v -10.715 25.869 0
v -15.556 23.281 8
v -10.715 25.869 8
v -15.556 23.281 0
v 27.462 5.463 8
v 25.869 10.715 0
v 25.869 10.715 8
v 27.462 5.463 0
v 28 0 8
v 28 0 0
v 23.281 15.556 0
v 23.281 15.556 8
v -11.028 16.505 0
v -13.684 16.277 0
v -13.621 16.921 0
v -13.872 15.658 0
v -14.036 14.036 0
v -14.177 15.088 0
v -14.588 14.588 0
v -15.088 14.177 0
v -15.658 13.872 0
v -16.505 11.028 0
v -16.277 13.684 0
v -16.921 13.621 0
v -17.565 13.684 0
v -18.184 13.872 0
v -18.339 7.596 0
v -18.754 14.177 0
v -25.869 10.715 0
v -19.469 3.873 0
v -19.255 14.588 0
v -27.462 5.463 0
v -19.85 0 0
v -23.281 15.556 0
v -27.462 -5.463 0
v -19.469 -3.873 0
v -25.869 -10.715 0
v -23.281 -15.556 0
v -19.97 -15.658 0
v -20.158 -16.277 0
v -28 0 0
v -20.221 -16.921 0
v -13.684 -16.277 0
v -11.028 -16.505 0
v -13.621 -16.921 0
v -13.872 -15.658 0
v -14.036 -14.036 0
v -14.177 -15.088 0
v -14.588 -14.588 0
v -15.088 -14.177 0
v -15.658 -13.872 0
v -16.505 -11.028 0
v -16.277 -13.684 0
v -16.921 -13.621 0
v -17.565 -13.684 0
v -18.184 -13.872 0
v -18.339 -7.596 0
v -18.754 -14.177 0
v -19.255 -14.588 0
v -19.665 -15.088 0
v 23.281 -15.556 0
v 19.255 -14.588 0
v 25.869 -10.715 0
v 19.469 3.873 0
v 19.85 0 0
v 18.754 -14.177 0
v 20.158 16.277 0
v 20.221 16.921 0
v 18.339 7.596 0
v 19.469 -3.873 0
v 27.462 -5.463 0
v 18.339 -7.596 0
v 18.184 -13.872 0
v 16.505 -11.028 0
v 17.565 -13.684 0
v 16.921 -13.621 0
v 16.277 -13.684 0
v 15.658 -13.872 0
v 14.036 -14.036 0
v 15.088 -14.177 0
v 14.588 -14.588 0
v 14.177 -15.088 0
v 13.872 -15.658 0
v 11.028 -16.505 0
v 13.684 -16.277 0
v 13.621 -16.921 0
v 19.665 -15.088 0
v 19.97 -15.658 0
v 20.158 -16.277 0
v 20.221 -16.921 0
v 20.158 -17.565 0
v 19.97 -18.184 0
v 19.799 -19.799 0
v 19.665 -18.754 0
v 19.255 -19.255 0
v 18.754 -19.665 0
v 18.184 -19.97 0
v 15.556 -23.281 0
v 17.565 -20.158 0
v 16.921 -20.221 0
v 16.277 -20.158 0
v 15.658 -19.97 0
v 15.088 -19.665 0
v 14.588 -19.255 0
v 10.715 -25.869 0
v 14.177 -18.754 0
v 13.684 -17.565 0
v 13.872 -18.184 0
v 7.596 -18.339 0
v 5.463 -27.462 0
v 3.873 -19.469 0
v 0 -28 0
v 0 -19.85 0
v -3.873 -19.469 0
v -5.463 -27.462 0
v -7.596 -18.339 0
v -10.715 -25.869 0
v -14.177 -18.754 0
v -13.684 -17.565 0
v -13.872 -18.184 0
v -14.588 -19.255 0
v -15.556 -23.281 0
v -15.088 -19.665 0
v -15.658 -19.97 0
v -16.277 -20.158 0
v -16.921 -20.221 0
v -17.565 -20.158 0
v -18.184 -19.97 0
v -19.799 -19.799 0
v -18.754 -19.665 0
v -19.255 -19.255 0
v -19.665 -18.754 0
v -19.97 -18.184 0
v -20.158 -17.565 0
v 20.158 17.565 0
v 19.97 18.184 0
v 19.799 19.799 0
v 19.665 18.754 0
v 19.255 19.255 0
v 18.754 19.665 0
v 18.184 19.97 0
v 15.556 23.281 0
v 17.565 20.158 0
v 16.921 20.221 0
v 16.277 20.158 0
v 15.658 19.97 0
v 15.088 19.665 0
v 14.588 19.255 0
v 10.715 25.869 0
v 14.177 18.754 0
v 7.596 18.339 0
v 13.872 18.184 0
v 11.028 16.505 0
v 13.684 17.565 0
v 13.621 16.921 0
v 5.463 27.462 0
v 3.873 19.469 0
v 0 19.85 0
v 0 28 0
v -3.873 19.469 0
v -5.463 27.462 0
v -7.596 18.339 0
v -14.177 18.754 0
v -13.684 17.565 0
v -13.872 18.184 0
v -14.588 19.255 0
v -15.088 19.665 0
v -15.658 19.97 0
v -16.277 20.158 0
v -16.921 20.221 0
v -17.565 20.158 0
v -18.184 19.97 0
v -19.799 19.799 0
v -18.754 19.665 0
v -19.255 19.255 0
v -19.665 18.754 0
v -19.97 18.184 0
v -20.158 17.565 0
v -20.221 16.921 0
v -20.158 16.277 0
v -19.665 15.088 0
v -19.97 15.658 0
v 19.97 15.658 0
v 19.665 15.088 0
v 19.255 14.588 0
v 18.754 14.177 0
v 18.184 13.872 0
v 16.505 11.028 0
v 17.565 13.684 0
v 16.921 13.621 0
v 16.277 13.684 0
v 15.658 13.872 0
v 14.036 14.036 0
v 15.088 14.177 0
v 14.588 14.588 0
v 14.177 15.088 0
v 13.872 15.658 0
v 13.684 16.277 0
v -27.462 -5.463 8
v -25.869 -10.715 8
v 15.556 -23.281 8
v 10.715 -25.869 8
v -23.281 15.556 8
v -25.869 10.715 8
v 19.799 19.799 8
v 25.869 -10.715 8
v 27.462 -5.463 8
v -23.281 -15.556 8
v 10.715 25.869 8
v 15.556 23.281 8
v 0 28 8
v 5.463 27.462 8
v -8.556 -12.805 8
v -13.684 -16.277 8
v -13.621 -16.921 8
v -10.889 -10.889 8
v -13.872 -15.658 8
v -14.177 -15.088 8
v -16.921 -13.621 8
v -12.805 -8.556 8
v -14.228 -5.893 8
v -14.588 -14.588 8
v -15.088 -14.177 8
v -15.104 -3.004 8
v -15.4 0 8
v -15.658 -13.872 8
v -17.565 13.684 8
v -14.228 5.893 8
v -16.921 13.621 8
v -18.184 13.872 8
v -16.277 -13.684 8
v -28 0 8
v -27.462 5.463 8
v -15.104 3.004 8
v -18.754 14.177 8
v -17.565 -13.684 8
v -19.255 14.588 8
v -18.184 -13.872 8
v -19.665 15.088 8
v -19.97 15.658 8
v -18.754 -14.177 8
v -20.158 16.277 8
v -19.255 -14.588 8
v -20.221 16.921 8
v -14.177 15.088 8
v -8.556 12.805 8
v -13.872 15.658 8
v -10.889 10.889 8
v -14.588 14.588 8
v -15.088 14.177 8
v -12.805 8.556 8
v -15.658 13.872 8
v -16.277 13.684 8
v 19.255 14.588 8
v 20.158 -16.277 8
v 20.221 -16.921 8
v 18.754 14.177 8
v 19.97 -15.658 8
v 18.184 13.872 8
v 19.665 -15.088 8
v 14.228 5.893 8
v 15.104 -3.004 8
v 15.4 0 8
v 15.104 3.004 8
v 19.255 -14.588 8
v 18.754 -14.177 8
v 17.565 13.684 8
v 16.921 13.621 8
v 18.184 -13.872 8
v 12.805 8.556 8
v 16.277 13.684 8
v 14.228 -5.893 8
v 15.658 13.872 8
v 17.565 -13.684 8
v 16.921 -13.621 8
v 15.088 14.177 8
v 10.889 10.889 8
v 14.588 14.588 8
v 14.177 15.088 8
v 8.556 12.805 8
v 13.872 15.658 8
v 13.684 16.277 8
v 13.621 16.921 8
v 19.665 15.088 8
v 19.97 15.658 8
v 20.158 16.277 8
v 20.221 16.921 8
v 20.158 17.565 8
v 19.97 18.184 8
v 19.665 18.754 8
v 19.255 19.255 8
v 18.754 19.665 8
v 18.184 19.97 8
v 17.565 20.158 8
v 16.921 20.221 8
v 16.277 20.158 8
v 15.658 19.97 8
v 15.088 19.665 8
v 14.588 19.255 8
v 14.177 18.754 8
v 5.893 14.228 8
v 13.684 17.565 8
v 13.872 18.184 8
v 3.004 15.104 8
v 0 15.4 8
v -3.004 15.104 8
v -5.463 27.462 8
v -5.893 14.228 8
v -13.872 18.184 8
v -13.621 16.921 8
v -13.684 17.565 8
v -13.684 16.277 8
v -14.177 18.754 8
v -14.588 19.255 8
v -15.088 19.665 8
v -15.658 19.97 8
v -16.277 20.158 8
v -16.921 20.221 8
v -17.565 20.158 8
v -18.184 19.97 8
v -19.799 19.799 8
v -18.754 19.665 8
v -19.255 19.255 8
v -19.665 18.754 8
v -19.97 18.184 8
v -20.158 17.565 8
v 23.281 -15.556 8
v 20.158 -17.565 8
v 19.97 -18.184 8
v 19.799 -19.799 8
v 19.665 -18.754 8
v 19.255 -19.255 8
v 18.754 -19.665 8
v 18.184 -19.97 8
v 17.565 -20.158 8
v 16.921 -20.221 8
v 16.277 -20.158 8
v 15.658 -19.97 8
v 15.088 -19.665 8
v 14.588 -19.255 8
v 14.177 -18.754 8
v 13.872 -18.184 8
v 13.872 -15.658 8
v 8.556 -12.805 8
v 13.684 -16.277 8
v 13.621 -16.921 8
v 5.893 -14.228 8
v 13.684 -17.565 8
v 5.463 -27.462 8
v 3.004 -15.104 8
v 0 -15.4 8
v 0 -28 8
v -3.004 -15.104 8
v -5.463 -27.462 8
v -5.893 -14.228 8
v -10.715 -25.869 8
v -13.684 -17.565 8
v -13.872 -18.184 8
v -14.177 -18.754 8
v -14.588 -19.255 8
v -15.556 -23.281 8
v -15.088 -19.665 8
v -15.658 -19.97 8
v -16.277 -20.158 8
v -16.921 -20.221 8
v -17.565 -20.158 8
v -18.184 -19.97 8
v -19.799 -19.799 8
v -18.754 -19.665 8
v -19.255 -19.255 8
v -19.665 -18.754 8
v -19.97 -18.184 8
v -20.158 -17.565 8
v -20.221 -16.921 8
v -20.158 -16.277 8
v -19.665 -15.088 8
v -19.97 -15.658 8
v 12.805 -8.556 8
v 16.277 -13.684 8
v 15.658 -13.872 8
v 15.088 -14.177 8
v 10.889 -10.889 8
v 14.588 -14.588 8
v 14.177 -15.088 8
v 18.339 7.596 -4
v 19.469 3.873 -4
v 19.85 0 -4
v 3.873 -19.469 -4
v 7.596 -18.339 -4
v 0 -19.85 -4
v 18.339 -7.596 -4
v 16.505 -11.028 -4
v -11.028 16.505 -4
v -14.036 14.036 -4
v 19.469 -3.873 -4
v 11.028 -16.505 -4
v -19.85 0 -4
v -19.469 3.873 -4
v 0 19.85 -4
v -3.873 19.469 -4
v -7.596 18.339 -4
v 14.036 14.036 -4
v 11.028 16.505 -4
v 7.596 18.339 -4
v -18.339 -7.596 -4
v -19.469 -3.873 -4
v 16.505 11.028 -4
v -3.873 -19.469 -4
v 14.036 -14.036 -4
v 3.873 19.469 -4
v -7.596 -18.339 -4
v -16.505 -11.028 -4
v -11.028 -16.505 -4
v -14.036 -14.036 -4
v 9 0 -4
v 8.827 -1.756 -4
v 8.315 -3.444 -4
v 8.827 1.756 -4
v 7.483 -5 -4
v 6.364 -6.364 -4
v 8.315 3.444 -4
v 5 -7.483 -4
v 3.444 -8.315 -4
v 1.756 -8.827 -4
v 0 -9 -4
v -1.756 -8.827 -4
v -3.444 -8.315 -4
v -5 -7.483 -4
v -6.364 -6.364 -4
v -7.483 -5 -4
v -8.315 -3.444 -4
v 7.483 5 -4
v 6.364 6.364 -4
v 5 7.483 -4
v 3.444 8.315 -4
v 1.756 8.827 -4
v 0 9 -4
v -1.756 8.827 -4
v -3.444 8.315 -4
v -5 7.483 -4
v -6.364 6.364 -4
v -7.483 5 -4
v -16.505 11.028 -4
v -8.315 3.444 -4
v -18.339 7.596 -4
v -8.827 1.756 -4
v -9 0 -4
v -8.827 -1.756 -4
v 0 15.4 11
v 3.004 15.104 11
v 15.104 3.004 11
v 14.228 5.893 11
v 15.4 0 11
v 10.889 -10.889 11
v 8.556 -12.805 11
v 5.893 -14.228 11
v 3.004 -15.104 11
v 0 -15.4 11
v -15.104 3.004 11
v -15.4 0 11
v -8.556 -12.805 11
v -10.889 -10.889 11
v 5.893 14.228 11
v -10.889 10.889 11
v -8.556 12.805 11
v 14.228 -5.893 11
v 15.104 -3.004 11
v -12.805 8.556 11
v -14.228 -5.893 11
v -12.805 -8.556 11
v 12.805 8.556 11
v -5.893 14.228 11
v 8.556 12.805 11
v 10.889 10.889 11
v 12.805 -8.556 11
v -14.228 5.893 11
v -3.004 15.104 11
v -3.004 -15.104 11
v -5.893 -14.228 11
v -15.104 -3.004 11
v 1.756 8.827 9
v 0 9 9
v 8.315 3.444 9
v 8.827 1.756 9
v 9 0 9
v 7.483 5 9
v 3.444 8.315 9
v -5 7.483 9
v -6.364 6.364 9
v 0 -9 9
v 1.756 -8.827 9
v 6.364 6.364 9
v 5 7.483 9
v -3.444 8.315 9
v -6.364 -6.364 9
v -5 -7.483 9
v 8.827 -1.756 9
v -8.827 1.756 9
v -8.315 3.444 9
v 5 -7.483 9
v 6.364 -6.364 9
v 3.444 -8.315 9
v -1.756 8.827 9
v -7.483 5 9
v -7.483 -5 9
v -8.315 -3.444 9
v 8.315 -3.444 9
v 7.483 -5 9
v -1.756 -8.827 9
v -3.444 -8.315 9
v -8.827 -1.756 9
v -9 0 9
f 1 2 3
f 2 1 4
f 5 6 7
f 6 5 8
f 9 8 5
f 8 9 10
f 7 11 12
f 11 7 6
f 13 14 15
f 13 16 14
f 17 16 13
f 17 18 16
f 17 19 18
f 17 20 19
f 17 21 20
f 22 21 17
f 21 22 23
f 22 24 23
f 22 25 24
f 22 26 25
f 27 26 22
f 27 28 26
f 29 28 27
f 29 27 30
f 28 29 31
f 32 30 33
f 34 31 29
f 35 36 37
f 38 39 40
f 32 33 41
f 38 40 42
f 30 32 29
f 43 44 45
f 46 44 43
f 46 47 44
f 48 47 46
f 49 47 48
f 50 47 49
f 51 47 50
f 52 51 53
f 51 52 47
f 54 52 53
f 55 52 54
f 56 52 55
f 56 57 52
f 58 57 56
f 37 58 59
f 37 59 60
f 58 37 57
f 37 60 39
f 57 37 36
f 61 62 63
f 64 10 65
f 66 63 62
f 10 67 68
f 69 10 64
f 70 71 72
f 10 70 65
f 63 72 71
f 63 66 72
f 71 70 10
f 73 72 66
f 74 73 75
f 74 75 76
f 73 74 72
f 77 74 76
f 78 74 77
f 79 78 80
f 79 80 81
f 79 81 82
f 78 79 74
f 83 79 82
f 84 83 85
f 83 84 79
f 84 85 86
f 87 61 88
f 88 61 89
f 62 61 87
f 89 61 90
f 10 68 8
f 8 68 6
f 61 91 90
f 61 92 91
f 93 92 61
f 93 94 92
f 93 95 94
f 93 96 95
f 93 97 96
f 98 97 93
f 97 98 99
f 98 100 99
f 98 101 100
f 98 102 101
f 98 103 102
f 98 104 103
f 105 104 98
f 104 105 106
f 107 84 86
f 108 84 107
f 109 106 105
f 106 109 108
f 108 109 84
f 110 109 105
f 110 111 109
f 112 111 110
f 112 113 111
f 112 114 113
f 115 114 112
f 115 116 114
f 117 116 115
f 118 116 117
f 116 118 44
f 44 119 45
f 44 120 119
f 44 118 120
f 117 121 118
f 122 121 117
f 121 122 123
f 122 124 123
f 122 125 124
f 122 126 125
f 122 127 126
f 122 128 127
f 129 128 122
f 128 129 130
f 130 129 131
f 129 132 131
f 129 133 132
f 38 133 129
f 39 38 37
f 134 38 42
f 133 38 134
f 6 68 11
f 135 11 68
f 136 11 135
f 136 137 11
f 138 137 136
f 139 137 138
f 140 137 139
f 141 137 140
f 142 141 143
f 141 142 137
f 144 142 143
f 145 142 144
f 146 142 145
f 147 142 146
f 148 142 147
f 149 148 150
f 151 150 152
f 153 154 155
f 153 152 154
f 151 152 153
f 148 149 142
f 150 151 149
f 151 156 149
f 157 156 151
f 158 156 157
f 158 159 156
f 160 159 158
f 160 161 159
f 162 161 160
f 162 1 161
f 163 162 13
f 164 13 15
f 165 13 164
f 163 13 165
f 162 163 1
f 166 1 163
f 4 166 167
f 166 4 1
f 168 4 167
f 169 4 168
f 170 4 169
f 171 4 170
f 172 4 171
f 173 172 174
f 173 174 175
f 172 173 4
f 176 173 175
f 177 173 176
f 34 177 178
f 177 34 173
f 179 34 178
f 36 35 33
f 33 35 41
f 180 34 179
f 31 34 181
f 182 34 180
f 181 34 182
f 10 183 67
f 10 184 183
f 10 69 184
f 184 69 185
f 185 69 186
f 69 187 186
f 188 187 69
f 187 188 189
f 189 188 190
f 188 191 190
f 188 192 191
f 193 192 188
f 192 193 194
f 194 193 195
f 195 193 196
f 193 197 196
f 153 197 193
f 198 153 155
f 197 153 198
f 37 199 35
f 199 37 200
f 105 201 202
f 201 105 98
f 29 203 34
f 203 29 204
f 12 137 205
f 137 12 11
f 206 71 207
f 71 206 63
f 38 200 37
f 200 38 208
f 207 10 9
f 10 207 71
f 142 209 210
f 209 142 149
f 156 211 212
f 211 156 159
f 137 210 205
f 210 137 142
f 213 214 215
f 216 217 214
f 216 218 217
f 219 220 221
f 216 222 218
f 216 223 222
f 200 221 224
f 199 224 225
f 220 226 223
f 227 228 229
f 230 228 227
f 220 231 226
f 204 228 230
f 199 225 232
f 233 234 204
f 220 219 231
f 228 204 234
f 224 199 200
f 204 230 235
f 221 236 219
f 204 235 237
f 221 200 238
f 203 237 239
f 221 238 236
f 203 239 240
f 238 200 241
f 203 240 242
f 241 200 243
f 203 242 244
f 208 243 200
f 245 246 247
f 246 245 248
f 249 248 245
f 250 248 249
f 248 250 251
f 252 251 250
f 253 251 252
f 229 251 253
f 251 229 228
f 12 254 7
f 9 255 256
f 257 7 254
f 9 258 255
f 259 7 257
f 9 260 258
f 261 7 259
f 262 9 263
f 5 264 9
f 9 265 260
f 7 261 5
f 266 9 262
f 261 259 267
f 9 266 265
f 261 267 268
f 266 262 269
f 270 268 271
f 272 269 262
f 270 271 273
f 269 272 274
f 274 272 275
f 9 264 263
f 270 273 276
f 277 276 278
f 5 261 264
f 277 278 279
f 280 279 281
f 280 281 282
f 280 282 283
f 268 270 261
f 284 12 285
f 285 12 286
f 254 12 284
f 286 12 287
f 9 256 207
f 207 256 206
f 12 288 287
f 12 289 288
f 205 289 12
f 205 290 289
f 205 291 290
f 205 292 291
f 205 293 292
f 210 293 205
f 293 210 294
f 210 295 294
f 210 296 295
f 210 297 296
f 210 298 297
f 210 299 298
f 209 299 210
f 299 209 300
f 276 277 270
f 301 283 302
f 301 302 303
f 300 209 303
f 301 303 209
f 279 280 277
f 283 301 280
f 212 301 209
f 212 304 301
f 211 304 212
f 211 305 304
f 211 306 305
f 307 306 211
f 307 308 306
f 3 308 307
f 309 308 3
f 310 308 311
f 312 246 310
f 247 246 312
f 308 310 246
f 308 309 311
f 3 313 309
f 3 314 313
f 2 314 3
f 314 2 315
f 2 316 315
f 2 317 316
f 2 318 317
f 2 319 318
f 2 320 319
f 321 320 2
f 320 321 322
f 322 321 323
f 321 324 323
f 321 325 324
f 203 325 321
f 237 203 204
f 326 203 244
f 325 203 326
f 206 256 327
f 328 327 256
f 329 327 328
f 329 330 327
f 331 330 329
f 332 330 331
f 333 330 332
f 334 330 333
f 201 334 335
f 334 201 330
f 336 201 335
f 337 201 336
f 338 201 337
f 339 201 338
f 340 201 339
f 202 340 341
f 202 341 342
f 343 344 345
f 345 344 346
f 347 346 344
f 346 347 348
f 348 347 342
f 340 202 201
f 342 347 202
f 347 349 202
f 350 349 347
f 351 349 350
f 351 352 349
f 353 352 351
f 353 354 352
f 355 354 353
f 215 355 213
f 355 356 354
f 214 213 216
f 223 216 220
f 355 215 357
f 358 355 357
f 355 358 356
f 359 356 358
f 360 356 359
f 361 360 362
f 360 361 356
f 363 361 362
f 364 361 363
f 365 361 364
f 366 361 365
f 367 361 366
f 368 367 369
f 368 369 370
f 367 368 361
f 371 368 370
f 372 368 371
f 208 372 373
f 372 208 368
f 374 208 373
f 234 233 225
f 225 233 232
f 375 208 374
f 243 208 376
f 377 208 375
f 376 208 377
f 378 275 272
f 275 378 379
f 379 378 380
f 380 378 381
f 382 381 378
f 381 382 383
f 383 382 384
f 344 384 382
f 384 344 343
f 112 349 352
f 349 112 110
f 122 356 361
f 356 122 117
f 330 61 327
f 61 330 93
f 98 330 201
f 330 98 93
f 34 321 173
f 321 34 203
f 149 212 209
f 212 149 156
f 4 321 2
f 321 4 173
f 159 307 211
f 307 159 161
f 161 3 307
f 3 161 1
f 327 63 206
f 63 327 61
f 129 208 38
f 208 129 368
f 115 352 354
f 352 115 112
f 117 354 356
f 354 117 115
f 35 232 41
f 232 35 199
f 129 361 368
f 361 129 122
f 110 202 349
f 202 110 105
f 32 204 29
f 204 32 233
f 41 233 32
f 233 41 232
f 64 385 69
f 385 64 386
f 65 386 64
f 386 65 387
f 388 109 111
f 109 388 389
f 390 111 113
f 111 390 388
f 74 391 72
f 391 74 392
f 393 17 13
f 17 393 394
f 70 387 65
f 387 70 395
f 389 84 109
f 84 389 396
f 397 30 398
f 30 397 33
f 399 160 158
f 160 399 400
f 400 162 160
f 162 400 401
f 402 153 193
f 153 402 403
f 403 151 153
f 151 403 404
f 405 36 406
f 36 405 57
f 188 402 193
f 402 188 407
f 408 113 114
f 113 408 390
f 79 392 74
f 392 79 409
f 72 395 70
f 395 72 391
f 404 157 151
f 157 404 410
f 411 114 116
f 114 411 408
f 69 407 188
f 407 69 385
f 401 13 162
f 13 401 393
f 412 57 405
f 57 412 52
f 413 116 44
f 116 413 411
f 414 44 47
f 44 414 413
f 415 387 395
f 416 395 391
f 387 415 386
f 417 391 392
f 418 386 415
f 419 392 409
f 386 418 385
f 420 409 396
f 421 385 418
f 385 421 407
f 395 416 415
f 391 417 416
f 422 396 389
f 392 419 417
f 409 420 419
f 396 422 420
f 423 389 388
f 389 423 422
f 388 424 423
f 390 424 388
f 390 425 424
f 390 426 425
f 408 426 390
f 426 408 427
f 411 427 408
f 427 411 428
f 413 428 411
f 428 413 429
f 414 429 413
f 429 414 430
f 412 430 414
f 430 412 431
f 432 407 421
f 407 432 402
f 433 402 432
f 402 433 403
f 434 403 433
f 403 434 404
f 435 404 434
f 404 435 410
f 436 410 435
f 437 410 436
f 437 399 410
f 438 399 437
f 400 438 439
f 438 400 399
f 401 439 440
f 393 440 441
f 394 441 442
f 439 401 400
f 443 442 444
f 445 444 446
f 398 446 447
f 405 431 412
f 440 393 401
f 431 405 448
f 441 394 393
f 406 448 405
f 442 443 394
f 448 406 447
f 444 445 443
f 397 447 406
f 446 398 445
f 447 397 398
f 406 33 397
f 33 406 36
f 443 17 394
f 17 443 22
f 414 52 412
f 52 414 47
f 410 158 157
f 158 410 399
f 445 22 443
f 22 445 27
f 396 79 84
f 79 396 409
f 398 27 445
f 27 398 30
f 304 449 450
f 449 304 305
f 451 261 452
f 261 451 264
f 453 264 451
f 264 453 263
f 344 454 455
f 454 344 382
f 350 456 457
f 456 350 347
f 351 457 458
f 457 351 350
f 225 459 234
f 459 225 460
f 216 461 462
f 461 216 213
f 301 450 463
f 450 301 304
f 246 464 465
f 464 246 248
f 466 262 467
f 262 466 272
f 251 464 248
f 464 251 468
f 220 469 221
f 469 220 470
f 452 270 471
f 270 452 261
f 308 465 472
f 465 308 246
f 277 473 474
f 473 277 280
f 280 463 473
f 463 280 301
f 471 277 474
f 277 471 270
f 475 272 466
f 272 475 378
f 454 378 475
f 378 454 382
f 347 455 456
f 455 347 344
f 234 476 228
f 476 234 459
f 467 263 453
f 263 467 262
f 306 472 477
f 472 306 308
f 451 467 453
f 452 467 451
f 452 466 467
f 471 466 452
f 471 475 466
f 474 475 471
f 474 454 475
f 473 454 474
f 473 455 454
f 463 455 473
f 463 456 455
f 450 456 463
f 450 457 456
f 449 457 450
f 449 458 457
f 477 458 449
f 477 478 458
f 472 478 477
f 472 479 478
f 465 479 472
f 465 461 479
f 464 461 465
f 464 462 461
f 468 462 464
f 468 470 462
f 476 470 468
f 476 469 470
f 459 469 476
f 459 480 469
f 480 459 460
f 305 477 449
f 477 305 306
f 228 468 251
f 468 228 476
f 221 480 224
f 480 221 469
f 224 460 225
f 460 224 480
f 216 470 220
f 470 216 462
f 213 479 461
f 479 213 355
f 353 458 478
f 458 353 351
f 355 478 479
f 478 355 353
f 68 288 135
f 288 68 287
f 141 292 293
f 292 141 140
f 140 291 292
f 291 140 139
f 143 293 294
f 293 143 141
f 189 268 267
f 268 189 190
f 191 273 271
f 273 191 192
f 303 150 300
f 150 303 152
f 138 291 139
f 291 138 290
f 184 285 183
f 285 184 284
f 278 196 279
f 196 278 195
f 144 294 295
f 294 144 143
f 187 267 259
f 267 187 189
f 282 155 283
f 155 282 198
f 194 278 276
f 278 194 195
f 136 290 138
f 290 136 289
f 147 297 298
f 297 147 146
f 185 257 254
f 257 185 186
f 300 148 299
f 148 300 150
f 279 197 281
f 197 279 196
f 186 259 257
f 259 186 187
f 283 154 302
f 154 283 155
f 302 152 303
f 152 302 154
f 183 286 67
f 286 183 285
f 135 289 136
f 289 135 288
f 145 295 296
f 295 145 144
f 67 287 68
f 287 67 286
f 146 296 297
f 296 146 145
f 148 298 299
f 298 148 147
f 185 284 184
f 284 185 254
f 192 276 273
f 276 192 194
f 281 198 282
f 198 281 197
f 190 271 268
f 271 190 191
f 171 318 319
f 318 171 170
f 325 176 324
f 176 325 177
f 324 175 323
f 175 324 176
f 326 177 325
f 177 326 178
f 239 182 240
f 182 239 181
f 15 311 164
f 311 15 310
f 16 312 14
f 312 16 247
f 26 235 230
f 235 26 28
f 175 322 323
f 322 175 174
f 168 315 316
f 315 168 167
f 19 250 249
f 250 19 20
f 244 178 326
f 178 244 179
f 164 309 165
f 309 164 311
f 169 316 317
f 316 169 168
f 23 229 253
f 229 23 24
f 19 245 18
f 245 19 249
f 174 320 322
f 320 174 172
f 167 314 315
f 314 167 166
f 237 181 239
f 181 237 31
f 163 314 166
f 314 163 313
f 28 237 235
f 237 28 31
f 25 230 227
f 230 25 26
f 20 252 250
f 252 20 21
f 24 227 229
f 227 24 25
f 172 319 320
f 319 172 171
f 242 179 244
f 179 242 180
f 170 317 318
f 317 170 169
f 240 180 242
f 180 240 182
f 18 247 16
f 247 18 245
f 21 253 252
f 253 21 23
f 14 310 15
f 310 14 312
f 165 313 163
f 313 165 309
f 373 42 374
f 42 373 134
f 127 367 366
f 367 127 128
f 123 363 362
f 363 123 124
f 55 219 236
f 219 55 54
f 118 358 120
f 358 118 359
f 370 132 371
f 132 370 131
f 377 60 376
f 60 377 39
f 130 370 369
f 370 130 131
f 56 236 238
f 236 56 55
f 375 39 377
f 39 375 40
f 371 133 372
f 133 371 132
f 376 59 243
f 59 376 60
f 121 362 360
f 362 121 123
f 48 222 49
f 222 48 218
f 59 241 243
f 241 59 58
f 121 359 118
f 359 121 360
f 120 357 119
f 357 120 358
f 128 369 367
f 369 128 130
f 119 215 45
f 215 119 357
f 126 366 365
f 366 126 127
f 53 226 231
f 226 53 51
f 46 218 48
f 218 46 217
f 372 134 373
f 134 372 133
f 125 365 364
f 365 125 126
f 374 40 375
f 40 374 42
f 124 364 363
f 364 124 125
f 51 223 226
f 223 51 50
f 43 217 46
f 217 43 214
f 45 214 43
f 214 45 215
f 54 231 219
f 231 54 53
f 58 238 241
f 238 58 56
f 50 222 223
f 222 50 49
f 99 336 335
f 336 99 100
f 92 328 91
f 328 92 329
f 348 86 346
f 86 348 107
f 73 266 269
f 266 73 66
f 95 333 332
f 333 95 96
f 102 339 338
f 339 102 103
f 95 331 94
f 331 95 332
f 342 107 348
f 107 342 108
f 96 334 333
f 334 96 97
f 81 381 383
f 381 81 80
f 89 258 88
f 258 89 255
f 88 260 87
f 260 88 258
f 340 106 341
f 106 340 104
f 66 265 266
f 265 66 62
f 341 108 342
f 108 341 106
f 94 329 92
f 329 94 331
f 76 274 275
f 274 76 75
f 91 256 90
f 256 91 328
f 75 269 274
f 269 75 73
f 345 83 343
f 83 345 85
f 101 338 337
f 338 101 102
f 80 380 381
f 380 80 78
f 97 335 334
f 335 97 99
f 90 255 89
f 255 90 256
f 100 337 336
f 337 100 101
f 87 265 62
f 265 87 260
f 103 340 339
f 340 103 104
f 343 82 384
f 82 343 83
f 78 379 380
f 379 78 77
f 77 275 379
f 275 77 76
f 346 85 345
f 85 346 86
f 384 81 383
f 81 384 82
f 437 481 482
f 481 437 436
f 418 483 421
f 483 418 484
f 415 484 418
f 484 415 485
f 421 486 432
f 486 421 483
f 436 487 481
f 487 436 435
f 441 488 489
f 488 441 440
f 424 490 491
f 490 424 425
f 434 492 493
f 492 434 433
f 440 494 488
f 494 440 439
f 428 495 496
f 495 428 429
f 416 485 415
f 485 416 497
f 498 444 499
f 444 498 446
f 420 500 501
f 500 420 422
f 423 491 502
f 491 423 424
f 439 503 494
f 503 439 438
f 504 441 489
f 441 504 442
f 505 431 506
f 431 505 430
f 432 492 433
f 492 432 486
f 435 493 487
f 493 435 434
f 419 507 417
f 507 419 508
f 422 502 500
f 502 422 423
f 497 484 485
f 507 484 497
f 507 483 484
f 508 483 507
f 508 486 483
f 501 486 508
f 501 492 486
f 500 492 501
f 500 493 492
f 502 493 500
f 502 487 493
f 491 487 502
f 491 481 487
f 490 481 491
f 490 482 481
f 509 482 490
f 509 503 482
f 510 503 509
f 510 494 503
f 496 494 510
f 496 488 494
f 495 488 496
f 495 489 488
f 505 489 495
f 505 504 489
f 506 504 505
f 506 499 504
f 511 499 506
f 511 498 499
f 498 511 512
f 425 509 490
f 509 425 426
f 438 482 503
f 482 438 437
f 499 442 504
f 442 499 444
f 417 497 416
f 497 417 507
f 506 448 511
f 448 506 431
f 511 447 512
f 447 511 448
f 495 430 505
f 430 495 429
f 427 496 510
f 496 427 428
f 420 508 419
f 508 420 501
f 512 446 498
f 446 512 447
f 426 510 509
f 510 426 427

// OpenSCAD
$fn = 32;

// ----------------------------------------------------------------------
// Retaining cap: 6203 cover, 56 mm, spigot 39.7 mm
// ----------------------------------------------------------------------

// --- parameters (mm) ---
plate_d = 56;             // cover diameter
plate_t = 8;              // cover thickness
boss_d = 39.7;            // spigot that enters the housing
boss_h = 4;               // spigot height
shaft_d = 18;             // shaft opening
bolt_d = 6.6;             // bolt clearance
bolt_r = 23.93;           // bolt circle radius
dome_h = 3;               // raised centre

module cover() {
  cylinder(h = plate_t, d = plate_d);
}

module spigot() {
  /* sunk 1 mm into the cover; the spigot sets the overall height */
  translate([0, 0, -boss_h]) cylinder(h = boss_h + 1, d = boss_d);
}

module dome() {
  translate([0, 0, plate_t - 1]) cylinder(h = dome_h + 1, d = plate_d * 0.55);
}

difference() {
  union() {
    cover();
    spigot();
    dome();
  }
  for (i = [0 : 3]) rotate([0, 0, 45 + i * 90]) translate([bolt_r, 0, -boss_h - 1])
    cylinder(h = boss_h + plate_t + 2, d = bolt_d);
  translate([0, 0, -boss_h - 1]) cylinder(h = boss_h + plate_t + 2, d = shaft_d);
}
